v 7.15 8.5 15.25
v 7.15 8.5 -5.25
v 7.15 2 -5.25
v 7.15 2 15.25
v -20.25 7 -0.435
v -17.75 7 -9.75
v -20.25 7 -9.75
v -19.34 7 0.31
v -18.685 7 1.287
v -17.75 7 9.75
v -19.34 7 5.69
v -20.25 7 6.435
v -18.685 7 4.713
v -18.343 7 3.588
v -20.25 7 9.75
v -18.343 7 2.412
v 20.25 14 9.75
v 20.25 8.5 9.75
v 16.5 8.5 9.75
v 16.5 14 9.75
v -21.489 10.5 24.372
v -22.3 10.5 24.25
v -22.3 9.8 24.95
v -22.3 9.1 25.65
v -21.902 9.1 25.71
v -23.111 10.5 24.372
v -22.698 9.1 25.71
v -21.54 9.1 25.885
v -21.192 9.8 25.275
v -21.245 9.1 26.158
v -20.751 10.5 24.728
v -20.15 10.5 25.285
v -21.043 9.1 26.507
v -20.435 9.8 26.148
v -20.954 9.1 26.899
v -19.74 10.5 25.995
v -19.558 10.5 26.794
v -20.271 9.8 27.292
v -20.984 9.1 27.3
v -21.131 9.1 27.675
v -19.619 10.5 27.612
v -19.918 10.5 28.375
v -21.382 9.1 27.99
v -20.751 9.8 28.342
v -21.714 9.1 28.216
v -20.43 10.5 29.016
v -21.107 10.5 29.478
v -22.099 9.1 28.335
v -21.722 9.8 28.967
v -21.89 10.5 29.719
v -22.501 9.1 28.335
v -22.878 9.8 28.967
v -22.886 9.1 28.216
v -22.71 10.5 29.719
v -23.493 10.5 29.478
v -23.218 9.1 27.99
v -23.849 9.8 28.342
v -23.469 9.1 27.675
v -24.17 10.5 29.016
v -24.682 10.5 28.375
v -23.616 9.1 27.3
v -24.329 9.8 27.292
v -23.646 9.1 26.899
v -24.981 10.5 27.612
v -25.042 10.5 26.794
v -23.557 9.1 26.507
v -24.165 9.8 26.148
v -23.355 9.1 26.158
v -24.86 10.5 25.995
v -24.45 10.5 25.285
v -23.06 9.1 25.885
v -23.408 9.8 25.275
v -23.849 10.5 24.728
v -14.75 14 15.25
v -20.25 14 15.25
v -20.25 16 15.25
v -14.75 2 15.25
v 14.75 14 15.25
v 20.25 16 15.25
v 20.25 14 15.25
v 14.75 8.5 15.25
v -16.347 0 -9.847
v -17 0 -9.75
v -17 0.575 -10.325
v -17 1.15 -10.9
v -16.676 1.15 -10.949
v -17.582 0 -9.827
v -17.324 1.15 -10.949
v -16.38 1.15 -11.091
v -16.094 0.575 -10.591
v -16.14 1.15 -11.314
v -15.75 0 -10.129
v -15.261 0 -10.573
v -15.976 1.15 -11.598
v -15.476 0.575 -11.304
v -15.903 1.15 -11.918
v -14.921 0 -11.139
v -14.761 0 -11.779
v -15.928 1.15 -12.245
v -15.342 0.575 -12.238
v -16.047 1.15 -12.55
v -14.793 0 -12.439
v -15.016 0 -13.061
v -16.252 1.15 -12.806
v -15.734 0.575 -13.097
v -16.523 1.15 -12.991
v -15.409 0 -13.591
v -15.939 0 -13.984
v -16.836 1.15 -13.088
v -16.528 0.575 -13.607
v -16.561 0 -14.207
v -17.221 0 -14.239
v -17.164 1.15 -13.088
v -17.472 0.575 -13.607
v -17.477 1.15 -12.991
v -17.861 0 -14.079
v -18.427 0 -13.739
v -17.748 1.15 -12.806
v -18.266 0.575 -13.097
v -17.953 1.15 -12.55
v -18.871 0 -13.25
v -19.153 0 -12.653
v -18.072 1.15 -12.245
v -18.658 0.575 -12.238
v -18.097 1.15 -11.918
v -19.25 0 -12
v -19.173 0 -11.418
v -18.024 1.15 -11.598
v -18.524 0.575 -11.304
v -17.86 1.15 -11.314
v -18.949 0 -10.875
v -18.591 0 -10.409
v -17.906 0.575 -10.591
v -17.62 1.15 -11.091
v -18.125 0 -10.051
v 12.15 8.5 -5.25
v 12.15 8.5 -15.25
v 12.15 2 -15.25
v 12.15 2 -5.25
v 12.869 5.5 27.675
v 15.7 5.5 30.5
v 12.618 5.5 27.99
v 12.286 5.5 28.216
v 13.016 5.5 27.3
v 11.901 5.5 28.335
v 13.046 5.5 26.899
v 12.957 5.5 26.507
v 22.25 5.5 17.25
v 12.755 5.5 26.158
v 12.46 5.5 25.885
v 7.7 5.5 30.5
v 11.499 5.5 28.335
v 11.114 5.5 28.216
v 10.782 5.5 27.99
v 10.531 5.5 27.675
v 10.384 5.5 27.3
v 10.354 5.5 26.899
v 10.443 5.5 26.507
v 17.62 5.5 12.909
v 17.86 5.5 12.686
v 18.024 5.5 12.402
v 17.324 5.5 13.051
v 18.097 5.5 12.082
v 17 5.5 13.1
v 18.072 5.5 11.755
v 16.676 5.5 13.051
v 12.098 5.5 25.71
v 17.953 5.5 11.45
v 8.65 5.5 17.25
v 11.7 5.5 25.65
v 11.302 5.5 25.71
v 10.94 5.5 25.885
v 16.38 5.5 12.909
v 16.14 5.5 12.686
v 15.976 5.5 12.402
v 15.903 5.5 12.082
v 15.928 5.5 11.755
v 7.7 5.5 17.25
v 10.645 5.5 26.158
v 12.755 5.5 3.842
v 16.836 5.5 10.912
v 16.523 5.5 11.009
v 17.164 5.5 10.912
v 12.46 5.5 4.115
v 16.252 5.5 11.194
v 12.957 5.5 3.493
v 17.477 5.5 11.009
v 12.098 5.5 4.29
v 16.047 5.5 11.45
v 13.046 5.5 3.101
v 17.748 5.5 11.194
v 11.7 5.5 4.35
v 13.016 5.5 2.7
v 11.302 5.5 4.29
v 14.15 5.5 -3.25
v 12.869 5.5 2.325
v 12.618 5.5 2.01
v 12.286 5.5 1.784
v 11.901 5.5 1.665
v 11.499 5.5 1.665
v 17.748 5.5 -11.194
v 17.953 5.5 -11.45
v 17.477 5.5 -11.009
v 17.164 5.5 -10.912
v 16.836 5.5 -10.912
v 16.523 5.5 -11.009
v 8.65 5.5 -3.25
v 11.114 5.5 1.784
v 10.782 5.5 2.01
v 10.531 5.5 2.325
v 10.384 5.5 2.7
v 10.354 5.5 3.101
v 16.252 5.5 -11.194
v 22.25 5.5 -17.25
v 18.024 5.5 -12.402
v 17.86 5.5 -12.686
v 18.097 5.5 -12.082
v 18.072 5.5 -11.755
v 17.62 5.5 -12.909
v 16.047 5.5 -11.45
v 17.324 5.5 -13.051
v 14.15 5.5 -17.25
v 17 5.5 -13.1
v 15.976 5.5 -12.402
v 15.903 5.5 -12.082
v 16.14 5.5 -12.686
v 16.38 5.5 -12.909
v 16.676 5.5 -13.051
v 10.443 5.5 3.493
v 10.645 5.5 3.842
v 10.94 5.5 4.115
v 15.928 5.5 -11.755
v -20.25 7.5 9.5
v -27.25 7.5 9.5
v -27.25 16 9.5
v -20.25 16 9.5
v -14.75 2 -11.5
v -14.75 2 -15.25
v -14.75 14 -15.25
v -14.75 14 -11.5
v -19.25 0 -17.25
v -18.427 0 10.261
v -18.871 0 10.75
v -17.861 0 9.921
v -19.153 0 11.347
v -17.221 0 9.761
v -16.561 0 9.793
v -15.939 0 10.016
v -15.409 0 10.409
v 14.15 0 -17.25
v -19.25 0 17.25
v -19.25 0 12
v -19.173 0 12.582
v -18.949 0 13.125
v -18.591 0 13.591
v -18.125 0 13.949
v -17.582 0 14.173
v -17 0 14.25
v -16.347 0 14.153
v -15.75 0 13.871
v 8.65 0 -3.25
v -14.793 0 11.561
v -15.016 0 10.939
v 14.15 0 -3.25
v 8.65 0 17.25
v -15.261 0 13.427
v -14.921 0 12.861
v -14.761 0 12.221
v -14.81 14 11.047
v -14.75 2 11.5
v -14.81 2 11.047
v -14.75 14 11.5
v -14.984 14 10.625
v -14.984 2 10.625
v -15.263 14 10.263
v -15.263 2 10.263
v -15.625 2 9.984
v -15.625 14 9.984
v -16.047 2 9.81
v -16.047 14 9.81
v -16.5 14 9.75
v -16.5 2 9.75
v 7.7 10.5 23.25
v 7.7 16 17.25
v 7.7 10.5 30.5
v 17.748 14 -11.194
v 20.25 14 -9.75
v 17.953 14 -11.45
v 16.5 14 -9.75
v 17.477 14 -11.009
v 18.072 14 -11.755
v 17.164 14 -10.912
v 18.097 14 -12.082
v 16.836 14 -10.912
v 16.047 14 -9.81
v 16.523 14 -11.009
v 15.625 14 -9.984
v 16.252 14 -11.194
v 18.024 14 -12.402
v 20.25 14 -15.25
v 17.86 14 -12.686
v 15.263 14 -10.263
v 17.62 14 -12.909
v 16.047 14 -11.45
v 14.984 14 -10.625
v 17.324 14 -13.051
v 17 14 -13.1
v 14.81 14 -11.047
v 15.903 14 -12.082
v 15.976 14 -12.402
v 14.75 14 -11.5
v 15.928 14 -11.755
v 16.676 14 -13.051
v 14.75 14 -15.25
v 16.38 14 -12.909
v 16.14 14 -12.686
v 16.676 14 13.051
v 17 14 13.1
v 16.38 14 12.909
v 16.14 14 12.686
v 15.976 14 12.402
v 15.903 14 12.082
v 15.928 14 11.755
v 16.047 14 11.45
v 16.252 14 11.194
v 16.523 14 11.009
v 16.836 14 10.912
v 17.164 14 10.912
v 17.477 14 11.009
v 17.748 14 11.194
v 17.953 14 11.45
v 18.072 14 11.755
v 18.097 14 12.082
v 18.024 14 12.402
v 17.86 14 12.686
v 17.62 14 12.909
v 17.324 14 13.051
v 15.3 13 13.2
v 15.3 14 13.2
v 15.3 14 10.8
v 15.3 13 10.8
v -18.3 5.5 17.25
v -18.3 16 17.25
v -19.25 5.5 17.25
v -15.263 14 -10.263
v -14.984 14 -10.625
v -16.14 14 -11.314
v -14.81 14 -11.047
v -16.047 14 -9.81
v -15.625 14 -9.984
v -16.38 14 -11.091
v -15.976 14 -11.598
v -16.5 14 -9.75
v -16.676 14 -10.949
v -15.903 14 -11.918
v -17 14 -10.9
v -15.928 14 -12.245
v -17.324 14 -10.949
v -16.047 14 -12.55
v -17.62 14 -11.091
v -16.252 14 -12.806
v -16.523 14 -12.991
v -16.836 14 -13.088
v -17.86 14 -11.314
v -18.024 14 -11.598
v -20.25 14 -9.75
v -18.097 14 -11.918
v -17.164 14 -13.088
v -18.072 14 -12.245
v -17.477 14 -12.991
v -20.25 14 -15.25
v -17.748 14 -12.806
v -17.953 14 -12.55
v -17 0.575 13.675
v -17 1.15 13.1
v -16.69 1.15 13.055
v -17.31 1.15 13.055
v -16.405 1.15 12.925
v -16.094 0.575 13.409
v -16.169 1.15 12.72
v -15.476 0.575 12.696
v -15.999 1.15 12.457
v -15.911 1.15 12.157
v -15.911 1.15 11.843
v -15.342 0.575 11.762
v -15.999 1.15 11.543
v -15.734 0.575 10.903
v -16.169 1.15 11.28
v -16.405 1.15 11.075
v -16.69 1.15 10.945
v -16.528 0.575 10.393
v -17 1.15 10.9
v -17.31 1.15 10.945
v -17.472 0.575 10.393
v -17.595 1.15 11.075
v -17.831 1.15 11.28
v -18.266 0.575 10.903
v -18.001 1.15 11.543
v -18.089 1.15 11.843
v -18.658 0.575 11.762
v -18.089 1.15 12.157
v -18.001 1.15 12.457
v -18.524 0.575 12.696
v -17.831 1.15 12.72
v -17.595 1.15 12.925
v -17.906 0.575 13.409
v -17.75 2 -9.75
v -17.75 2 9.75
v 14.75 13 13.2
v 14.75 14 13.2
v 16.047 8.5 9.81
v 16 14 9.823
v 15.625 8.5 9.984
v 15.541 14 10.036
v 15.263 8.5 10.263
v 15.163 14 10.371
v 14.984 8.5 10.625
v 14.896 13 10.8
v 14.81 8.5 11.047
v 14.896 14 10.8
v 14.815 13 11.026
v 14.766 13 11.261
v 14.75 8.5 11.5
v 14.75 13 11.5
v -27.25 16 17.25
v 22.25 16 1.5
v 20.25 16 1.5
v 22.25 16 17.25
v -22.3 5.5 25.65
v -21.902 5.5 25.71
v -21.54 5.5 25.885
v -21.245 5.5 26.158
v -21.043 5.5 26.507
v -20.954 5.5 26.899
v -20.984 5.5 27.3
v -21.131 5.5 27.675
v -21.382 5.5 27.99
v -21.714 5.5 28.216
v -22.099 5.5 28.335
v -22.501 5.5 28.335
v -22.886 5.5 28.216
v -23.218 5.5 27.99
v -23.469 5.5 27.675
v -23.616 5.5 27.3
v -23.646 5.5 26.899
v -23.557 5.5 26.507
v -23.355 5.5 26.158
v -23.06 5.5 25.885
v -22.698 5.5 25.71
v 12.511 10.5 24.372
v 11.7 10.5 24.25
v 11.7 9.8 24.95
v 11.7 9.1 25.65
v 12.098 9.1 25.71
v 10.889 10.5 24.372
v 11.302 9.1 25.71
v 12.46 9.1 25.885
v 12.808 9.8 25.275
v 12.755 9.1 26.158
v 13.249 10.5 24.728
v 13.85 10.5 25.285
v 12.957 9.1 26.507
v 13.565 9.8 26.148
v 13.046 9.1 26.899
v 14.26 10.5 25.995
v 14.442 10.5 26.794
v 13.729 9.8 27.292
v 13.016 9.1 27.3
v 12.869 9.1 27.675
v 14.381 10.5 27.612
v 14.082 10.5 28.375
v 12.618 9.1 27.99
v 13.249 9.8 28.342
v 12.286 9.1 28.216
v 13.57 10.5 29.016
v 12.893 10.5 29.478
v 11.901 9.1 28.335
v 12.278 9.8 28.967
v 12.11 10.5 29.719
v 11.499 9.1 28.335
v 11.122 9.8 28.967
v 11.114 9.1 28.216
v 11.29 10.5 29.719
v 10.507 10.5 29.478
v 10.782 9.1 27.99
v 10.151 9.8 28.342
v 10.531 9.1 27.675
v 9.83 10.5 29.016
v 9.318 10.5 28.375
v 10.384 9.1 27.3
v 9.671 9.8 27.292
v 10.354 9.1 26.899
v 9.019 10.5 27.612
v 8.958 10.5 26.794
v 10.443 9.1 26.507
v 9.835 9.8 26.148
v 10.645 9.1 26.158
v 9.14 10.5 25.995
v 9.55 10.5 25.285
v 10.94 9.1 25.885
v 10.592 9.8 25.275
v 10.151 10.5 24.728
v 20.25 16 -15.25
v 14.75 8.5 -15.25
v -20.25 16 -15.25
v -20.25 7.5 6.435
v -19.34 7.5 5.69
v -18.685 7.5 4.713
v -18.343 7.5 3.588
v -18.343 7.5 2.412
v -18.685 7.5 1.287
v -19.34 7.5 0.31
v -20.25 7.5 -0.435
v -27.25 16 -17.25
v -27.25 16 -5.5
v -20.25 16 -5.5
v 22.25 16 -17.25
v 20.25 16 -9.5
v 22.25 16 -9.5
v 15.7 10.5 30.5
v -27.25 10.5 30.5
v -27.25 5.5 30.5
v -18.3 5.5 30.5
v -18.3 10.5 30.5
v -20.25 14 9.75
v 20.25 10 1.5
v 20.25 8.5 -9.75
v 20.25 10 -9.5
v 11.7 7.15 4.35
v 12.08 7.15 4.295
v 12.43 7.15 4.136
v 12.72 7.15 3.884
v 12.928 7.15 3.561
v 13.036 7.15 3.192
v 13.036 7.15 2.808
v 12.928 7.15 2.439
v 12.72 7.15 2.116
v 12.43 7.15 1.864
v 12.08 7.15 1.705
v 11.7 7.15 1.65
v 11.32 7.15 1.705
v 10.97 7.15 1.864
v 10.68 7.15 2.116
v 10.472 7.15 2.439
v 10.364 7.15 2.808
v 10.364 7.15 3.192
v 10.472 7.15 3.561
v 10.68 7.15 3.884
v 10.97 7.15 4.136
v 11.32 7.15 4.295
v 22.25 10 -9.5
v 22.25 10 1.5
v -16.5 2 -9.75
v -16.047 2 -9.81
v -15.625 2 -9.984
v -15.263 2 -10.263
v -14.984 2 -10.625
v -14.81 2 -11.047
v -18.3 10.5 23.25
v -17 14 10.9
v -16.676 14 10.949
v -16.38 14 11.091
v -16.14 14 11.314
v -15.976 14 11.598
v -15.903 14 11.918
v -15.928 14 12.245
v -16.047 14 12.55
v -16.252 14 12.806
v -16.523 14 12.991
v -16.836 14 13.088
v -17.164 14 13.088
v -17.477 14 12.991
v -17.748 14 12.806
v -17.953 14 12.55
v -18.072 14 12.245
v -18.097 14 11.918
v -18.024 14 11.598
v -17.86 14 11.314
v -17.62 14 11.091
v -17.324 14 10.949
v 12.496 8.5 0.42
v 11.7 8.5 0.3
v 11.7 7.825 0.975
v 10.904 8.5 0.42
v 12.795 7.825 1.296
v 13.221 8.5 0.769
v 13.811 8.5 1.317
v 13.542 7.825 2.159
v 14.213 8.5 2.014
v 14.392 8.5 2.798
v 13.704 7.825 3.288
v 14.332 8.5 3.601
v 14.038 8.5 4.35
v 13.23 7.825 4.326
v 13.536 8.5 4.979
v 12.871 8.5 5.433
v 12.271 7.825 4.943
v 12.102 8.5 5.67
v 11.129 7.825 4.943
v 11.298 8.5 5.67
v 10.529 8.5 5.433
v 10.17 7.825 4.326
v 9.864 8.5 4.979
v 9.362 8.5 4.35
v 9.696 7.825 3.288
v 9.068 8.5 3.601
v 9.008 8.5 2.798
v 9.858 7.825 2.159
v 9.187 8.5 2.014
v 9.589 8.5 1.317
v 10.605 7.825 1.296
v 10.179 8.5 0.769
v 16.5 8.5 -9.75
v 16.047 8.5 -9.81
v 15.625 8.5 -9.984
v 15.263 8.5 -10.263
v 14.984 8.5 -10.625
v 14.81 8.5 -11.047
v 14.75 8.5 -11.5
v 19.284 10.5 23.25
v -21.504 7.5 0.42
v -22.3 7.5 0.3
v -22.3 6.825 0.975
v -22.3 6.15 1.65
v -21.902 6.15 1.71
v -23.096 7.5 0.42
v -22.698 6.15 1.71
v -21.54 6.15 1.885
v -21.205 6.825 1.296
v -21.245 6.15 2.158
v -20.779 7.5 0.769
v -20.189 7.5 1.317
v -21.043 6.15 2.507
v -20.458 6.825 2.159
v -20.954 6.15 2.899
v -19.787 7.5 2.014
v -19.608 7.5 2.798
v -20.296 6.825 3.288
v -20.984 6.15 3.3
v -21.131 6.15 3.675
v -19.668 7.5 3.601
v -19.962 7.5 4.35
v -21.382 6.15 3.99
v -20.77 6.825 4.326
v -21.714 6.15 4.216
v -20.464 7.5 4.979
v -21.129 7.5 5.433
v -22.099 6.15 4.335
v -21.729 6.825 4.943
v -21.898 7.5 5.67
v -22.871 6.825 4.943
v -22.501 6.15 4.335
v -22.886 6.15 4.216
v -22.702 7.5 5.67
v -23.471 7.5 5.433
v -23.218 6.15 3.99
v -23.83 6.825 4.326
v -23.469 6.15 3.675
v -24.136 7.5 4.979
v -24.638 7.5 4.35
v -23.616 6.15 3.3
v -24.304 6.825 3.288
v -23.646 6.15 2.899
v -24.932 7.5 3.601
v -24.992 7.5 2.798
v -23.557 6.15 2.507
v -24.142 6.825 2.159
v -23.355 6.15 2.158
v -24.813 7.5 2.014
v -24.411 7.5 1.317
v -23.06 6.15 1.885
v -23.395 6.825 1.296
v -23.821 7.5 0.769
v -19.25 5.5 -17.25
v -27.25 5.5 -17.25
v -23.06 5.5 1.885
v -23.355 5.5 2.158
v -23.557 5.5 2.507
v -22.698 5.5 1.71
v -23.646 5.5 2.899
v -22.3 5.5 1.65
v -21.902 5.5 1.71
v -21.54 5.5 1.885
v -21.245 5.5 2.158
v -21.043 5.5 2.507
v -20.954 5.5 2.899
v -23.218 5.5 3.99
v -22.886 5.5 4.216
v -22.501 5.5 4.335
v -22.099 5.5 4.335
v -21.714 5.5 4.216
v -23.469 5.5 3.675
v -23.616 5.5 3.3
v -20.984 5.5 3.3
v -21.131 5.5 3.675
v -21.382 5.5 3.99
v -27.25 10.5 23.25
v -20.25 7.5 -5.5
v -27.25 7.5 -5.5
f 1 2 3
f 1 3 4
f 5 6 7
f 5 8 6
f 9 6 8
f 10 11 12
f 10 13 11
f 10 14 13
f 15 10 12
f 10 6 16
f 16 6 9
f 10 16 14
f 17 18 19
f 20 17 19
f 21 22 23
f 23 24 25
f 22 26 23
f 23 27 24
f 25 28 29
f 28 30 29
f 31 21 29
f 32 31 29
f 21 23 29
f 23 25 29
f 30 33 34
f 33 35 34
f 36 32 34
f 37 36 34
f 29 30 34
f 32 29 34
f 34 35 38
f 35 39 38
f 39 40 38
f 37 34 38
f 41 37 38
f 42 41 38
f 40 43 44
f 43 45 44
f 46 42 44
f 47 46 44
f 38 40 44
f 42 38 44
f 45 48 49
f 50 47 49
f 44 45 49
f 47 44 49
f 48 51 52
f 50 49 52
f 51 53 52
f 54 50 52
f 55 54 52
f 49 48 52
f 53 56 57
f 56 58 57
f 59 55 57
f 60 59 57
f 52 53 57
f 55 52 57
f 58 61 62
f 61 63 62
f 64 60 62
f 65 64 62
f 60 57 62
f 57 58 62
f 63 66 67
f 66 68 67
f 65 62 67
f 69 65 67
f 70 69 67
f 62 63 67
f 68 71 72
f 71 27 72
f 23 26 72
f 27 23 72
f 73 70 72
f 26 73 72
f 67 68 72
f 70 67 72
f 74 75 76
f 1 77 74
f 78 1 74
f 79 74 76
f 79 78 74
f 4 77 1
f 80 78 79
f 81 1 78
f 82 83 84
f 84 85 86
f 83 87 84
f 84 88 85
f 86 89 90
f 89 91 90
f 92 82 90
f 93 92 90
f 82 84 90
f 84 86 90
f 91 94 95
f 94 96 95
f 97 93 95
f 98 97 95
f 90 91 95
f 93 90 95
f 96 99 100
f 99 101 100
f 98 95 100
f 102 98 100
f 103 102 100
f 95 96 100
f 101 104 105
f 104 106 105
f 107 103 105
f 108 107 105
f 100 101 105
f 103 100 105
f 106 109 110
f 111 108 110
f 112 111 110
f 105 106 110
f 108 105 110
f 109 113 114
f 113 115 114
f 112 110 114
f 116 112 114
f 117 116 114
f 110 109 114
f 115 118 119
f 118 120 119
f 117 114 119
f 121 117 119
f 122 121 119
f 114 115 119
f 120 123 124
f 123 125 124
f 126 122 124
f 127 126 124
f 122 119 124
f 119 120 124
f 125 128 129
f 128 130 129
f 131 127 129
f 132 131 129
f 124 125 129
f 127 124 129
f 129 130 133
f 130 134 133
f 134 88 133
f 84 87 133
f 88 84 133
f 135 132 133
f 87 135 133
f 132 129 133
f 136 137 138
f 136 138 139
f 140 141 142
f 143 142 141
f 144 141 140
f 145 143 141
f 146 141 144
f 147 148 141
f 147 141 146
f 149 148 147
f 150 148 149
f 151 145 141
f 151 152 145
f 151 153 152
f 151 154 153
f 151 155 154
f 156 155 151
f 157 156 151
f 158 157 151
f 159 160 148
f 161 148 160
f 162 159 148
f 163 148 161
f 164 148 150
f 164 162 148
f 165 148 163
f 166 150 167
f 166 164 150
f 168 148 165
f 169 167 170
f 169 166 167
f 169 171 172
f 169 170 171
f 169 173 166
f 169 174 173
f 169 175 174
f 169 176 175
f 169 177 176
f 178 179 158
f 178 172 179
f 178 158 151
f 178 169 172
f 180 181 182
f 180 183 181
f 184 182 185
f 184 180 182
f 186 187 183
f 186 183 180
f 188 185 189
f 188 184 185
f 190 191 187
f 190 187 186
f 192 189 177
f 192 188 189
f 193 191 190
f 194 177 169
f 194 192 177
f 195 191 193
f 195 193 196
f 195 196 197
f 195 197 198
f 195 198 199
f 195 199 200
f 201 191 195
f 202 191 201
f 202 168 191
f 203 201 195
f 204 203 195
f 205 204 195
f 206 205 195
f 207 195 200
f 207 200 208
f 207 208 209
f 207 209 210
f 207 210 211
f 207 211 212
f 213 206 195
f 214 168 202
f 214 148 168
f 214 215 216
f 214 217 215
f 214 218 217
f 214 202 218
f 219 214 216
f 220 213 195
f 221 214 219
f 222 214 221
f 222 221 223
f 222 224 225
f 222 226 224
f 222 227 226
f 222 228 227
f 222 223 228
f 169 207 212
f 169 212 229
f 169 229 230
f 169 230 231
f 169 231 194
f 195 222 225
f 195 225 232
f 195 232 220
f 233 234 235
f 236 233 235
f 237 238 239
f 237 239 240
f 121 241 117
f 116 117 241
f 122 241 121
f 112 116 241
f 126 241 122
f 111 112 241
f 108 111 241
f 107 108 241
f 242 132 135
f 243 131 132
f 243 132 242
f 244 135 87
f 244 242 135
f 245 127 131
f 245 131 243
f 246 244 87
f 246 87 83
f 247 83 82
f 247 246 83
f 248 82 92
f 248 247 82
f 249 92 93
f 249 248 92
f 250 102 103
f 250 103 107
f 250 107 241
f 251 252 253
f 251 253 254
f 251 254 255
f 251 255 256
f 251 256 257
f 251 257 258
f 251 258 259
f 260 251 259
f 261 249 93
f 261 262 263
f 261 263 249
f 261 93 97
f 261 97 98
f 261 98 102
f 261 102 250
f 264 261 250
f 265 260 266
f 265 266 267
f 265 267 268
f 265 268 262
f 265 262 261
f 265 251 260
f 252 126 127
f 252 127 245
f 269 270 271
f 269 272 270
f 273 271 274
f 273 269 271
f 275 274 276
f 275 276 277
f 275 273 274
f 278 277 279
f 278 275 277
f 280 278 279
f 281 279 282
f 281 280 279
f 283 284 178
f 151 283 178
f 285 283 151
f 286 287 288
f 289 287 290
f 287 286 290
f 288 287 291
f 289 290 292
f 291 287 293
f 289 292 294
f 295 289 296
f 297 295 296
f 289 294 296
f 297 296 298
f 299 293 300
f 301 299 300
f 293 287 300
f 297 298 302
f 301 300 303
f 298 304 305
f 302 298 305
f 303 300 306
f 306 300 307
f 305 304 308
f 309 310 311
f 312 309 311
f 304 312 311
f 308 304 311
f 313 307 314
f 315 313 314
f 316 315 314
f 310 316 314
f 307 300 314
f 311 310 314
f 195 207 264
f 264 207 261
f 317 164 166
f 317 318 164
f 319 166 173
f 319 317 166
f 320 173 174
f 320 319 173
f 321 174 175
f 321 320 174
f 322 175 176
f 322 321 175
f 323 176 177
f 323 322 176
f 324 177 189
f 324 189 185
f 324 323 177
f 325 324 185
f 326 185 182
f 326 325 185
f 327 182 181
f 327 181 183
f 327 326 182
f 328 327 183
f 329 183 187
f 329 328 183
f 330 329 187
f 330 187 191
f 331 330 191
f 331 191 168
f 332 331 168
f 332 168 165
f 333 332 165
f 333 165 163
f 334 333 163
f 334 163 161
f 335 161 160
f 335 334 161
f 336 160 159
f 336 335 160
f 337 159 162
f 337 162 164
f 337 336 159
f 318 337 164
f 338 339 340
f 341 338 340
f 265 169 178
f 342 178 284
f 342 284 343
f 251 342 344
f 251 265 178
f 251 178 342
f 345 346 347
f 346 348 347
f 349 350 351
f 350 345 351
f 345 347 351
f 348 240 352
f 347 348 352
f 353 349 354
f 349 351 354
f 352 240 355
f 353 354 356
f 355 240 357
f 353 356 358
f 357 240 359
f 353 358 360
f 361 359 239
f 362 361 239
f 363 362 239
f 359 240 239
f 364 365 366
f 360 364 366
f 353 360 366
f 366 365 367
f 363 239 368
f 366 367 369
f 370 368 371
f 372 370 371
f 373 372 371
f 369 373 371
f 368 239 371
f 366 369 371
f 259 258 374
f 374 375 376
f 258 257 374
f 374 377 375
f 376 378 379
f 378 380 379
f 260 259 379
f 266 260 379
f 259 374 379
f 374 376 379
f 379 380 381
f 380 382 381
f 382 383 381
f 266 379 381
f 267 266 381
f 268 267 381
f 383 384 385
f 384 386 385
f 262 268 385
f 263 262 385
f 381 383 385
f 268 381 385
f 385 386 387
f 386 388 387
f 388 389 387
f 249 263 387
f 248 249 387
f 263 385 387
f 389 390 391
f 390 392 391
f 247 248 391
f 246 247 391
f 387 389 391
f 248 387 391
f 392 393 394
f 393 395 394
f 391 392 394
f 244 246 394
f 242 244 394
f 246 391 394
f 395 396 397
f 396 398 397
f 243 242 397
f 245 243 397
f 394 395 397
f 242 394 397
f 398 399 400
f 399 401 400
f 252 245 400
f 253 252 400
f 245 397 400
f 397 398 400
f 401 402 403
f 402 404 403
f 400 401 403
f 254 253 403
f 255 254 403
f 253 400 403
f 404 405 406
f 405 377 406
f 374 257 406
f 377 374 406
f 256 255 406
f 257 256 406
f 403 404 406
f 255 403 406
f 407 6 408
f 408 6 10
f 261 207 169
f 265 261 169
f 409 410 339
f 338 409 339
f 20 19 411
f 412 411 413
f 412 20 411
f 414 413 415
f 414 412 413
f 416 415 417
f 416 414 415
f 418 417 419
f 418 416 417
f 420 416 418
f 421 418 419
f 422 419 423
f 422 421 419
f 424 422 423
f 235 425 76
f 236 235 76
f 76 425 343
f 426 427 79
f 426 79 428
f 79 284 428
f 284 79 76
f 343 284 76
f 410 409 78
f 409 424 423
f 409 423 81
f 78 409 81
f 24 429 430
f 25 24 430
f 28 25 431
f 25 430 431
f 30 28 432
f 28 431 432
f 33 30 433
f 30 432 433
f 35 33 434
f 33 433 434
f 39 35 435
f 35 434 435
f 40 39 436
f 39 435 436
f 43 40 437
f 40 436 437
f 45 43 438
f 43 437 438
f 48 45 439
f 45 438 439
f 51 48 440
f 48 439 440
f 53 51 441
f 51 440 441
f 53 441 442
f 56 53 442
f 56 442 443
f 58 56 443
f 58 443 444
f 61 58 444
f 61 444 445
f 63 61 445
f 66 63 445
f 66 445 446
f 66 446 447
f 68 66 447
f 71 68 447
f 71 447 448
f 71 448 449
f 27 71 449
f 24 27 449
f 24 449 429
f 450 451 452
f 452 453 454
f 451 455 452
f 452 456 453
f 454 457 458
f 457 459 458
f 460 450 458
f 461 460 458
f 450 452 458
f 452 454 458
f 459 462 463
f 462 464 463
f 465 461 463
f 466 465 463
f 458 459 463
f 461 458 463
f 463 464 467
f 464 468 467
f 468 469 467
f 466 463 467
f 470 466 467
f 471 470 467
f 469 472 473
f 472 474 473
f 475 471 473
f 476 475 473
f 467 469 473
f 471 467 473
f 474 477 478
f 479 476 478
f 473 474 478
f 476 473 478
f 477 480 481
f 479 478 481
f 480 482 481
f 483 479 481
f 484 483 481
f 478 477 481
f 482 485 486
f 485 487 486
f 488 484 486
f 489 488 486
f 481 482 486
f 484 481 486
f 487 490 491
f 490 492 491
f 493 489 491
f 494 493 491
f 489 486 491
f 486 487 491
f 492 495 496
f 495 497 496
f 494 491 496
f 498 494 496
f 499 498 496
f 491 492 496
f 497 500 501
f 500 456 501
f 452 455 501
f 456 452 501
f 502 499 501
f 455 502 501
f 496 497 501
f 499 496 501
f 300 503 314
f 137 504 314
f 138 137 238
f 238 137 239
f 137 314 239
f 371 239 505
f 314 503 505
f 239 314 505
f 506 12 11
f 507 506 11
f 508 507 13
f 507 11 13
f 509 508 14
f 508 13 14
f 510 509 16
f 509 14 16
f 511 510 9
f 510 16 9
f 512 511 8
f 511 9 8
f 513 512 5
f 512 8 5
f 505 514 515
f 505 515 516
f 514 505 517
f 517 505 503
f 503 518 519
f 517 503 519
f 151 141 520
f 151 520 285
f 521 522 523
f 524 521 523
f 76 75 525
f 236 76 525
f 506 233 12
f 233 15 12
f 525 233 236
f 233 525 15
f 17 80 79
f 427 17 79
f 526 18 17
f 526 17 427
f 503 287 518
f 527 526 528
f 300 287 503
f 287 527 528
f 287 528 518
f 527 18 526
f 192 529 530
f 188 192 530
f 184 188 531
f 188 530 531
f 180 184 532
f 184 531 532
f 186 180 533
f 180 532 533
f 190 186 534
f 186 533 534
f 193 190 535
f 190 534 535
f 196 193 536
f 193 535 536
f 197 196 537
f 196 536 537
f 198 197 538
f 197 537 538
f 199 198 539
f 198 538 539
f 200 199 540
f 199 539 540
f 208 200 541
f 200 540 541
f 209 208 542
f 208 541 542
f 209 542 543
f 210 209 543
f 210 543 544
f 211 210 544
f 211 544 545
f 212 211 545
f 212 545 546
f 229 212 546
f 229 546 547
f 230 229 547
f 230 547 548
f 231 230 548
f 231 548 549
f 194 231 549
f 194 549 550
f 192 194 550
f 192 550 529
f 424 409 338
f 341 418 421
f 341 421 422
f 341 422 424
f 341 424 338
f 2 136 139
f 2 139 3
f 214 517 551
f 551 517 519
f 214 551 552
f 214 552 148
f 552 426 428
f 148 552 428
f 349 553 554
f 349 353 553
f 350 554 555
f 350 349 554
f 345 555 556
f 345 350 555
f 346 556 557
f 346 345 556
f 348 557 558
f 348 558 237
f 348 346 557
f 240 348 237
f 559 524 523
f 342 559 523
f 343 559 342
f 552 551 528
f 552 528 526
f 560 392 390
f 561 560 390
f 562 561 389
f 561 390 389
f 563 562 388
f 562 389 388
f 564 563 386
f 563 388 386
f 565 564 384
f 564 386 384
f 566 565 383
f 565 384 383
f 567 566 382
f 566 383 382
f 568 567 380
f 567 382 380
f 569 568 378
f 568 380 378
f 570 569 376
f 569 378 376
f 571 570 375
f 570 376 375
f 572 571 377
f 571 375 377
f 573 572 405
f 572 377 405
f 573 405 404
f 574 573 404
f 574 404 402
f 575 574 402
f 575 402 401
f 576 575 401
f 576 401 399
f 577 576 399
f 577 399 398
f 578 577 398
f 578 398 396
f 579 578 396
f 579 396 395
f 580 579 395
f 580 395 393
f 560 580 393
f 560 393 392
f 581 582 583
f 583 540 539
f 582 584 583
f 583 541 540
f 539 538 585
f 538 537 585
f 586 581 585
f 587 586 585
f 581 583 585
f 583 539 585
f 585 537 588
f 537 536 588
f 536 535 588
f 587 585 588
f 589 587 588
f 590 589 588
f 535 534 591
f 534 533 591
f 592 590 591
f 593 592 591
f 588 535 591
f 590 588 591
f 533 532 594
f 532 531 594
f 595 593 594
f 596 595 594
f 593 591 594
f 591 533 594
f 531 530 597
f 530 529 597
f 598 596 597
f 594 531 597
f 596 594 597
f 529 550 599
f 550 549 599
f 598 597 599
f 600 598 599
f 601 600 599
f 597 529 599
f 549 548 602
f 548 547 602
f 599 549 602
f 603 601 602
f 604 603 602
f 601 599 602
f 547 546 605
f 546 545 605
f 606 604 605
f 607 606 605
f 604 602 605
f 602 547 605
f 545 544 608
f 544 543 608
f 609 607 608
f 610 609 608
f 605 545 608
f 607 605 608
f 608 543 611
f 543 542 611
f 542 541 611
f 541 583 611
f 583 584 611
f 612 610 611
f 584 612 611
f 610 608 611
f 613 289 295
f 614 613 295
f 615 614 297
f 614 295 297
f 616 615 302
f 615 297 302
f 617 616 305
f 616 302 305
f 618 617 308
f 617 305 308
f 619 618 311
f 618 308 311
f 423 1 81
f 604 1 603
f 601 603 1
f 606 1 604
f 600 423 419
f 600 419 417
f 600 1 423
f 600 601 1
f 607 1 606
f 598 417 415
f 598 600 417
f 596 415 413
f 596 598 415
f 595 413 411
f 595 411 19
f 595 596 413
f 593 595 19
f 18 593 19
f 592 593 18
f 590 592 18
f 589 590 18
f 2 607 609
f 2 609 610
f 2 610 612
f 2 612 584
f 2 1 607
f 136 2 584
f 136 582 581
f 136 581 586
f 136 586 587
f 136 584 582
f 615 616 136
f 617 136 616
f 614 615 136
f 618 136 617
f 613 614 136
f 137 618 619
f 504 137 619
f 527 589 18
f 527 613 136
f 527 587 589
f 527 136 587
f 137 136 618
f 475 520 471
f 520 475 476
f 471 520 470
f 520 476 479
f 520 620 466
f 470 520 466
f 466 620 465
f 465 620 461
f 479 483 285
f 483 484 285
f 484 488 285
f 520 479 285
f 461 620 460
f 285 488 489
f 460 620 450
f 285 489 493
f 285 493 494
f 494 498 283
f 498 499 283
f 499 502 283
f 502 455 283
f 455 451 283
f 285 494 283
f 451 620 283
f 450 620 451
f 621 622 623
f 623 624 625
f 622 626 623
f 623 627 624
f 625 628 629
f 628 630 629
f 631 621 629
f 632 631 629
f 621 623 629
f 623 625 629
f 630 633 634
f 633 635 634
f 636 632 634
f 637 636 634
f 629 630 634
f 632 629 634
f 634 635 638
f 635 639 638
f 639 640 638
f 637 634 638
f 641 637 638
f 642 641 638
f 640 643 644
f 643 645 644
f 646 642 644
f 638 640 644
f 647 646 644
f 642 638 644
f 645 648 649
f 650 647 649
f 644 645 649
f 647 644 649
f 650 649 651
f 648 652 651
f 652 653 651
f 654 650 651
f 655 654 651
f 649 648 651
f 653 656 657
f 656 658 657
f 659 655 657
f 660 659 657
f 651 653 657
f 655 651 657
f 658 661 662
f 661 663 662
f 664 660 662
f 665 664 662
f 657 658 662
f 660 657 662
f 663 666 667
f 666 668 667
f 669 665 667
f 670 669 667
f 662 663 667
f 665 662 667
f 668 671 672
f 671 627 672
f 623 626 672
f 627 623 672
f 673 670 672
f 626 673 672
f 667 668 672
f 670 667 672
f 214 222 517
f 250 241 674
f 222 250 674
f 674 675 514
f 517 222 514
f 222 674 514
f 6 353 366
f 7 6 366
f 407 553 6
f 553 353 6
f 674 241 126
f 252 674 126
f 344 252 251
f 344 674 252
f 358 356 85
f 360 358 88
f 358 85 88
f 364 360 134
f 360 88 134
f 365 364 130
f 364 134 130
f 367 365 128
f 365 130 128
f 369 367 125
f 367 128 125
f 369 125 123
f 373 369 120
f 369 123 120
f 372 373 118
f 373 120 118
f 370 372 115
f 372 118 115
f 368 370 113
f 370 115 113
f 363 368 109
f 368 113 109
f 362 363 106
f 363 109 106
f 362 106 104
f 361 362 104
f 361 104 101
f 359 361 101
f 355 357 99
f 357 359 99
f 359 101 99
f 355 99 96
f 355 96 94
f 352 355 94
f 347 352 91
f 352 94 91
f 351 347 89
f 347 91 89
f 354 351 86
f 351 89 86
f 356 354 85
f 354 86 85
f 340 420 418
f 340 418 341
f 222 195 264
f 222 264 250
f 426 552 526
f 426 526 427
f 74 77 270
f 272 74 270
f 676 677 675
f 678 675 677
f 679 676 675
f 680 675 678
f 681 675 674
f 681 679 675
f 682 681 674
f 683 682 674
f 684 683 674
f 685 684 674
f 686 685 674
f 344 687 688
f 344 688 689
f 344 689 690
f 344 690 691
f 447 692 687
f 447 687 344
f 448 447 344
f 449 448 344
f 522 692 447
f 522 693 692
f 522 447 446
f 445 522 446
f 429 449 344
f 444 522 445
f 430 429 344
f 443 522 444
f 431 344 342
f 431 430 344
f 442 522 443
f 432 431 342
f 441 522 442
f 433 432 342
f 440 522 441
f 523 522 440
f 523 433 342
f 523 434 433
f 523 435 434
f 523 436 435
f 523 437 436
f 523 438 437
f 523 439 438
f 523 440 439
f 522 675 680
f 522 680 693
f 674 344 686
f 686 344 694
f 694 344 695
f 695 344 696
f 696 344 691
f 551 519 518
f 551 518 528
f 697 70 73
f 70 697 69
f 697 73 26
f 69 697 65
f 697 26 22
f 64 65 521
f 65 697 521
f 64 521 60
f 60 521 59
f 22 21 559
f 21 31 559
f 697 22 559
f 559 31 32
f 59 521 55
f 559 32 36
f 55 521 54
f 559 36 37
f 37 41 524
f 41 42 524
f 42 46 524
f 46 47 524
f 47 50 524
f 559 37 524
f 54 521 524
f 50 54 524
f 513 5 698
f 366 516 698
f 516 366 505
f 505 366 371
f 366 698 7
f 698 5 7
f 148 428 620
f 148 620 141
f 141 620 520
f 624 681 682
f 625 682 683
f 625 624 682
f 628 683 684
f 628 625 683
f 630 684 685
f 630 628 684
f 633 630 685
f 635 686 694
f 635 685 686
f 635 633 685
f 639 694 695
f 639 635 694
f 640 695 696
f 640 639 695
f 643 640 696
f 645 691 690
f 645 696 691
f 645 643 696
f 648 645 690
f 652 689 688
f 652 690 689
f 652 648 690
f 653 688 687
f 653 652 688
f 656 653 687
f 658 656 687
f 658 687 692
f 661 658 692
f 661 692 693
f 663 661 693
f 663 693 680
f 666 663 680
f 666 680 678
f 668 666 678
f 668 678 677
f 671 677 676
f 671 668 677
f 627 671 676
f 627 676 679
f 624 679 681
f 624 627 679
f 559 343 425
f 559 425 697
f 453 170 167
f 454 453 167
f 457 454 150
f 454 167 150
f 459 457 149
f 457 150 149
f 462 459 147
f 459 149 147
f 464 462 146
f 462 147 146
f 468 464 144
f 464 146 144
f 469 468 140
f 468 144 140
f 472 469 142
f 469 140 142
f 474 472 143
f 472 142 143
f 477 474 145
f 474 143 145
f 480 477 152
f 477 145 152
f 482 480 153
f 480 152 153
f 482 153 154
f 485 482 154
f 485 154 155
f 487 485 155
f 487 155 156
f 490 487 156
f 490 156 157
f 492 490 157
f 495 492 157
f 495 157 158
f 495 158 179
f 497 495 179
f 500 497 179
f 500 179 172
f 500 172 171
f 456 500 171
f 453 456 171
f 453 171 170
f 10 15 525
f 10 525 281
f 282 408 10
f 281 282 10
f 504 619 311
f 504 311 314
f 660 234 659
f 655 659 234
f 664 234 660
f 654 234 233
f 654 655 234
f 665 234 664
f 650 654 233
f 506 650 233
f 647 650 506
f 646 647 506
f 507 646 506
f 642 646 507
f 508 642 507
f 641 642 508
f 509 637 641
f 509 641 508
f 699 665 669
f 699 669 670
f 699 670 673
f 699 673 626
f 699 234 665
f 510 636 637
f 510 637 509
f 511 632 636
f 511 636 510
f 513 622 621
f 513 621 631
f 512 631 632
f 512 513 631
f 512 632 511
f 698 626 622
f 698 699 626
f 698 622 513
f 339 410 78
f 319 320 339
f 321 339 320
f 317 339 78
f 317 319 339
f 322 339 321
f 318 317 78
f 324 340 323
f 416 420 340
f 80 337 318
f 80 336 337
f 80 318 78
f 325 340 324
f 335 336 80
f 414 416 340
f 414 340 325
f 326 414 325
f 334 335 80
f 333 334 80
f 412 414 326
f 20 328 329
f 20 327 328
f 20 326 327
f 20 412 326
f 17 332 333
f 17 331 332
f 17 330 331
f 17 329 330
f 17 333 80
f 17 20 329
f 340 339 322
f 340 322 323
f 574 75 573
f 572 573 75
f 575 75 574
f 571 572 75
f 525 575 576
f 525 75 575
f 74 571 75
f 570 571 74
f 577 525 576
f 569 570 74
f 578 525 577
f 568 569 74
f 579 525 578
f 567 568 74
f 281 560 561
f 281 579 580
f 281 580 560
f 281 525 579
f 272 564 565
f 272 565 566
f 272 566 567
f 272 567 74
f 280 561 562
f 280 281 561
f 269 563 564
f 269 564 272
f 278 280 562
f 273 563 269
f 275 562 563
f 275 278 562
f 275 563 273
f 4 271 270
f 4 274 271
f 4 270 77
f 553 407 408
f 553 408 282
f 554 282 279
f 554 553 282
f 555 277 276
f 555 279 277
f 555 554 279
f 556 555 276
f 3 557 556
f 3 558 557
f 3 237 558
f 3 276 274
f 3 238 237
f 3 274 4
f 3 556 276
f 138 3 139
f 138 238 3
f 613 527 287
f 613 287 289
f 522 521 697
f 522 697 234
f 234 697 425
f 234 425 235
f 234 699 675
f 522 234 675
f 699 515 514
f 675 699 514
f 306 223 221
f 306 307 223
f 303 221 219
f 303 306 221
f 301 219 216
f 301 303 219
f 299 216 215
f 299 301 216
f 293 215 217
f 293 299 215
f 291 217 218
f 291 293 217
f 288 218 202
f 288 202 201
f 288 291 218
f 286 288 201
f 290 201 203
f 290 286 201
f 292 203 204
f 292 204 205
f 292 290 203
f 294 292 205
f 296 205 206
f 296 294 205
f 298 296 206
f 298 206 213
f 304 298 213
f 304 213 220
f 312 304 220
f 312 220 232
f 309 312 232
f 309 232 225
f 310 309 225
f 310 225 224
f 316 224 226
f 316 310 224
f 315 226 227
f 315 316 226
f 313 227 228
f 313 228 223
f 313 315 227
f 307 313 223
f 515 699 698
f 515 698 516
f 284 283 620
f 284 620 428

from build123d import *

# Parameters (mm, degrees)
SKETCH_1_W                          = 44.5
SKETCH_1_H                          = 34.5
EXTRUDE_1_DEPTH                     = 16
SHELL_1_T                           = -2
SKETCH_2_W                          = 5.5000000000000036
SKETCH_2_H                          = 5.499999999999993
EXTRUDE_2_DEPTH                     = 12
SKETCH_3_R                          = 1.0999999999999992
CUT_EXTRUDE_1_DEPTH                 = 32.44240766862487
FILLET_1_R                          = 1.75
SKETCH_7_W                          = 15.099999999999996
SKETCH_7_H                          = 34.5
CUT_EXTRUDE_4_DEPTH                 = 7
SKETCH_8_W                          = 15.099999999999996
SKETCH_8_H                          = 34.5
SKETCH_8_R                          = 1.0999999999999992
EXTRUDE_3_DEPTH                     = 1.5
EXTRUDE_4_DEPTH                     = 1.5
CUT_EXTRUDE_6_DEPTH                 = 5
SKETCH_13_W                         = 34.5
SKETCH_13_H                         = 5.5
EXTRUDE_7_DEPTH                     = 1.5
SKETCH_14_R                         = 1.0999999999999992
SKETCH_14_R_2                       = 1.0999999999999954
CUT_EXTRUDE_7_DEPTH                 = 33.382479830920914
EXTRUDE_8_DEPTH                     = 10.5
SKETCH_18_W                         = 8.950000000000003
SKETCH_18_H                         = 13.250000000000004
SKETCH_18_R                         = 1.3500000000000054
SKETCH_18_R_2                       = 1.3500000000000005
EXTRUDE_9_DEPTH                     = 5
CUT_EXTRUDE_8_DEPTH                 = 43.22632472759144
CUT_EXTRUDE_8_DEPTH_BACK            = 43.22632472759144
SKETCH_18_3_R                       = 1.3500000000000059
SKETCH_18_3_R_2                     = 1.3500000000000005
HOLE_WIZARD_M2_5_1_D                = 2.7
HOLE_WIZARD_M2_5_1_DEPTH            = 24.83
HOLE_WIZARD_M2_5_1_CSINK_D          = 5.5
HOLE_WIZARD_M2_5_1_CSINK_ANGLE      = 90
HOLE_WIZARD_M2_5_1_TIP              = 0.8111618356872065
EXTRUDE_10_DEPTH                    = 8.95
SKETCH_22_W                         = 2
SKETCH_22_H                         = 2.399999999999997
CUT_EXTRUDE_9_DEPTH                 = 1
HOLE_WIZARD_1_D                     = 2.2
HOLE_WIZARD_1_CSINK_D               = 4.5
HOLE_WIZARD_1_CSINK_ANGLE           = 90
CUT_EXTRUDE_10_DEPTH                = 42.878544626097025
EXTRUDE_11_DEPTH                    = 2
EXTRUDE_START                       = -2
EXTRUDE_12_DEPTH                    = 2
EXTRUDE_13_DEPTH                    = 2
EXTRUDE_14_DEPTH                    = 2
SKETCH_31_W                         = 15
SKETCH_31_H                         = 8.5
CUT_EXTRUDE_11_DEPTH                = 10
EXTRUDE_START_2                     = 1.5
SKETCH_32_R                         = 1.3500000000000005
EXTRUDE_15_DEPTH                    = 1.5
EXTRUDE_START_3                     = -0.5
SKETCH_34_R                         = 3.999999999999999
SKETCH_34_R_2                       = 1.3500000000000059
EXTRUDE_18_DEPTH                    = 0.5
HOLE_WIZARD_2_D                     = 2.7
HOLE_WIZARD_2_CSINK_D               = 5.4
HOLE_WIZARD_2_CSINK_ANGLE           = 90
HOLE_WIZARD_2_ON_FACE_2_D           = 2.7
HOLE_WIZARD_2_ON_FACE_2_CSINK_D     = 5.4
HOLE_WIZARD_2_ON_FACE_2_CSINK_ANGLE = 90
EXTRUDE_19_DEPTH                    = 5
EXTRUDE_20_DEPTH                    = 17.499999999999996
CUT_EXTRUDE_12_DEPTH                = 17.499999999999996


with BuildPart() as part:
    # 草图1 → 凸台-拉伸1 (new body)
    with BuildSketch(Plane(origin=(0, 0, 0), x_dir=(1, 0, 0), z_dir=(0, 1, 0))):
        Rectangle(SKETCH_1_W, SKETCH_1_H)
    extrude(amount=EXTRUDE_1_DEPTH)

    # 抽壳1
    shell_1_openings = [part.faces().sort_by_distance(p)[0] for p in [
        (0, 16, 0),
    ]]
    offset(amount=SHELL_1_T, openings=shell_1_openings, kind=Kind.INTERSECTION)

    # 草图2 → 凸台-拉伸2 (add)
    with BuildSketch(Plane(origin=(0, 2, 0), x_dir=(1, 0, 0), z_dir=(0, 1, 0))):
        Polygon((20.249999999999996, -15.250000000000002), (20.25, -9.75), (14.749999999999993, -9.749999999999996), (14.749999999999995, -15.250000000000005), align=None)
        Polygon((-20.249999999999996, 15.250000000000002), (-14.749999999999995, 15.250000000000002), (-14.749999999999995, 9.750000000000002), (-20.249999999999993, 9.750000000000002), align=None)
        with Locations((-17.499999999999993, -12.500000000000005)):
            Rectangle(SKETCH_2_W, SKETCH_2_H)
        Polygon((20.249999999999996, 9.75), (14.749999999999991, 9.749999999999996), (14.749999999999991, 15.250000000000005), (20.249999999999996, 15.250000000000002), align=None)
    extrude(amount=EXTRUDE_2_DEPTH)

    # 草图3 → 切除-拉伸1 (cut, through all)
    with BuildSketch(Plane(origin=(0, 14, 0), x_dir=(1, 0, 0), z_dir=(0, 1, 0))):
        with Locations(Location((-17, 12, 0), (0, 0, 270))):
            Circle(SKETCH_3_R)
        with Locations(Location((17, 12, 0), (0, 0, 90))):
            Circle(SKETCH_3_R)
        with Locations(Location((17, -12, 0), (0, 0, 270))):
            Circle(SKETCH_3_R)
        with Locations(Location((-17, -12, 0), (0, 0, 90))):
            Circle(SKETCH_3_R)
    extrude(amount=-CUT_EXTRUDE_1_DEPTH, mode=Mode.SUBTRACT)

    # 圆角1
    fillet_1_edges = [part.edges().sort_by_distance(p)[0] for p in [
        (-14.749999999999995, 8, -9.750000000000002),
        (-14.749999999999993, 8, 9.750000000000009),
        (14.749999999999993, 8, 9.749999999999996),
        (14.749999999999991, 8, -9.749999999999996),
    ]]
    fillet(fillet_1_edges, radius=FILLET_1_R)

    # 草图7 → 切除-拉伸4 (cut)
    with BuildSketch(Plane.XZ):
        with Locations((14.700000000000003, 0)):
            Rectangle(SKETCH_7_W, SKETCH_7_H)
        Polygon((-22.25, 17.25), (-17.75, 17.25), (-17.74999999999999, -17.25), (-22.25, -17.25), align=None)
    extrude(amount=-CUT_EXTRUDE_4_DEPTH, mode=Mode.SUBTRACT)

    # 草图8 → 凸台-拉伸3 (add)
    # profile 1 of 2: a face of its own
    with BuildSketch(Plane.XZ.offset(-7)):
        with Locations((14.700000000000003, 0)):
            Rectangle(SKETCH_8_W, SKETCH_8_H)
        with Locations(Location((17, 12, 0), (0, 0, 90))):
            Circle(SKETCH_8_R, mode=Mode.SUBTRACT)
        with Locations(Location((17, -12, 0), (0, 0, 270))):
            Circle(SKETCH_8_R, mode=Mode.SUBTRACT)
    # profile 2 of 2: a face of its own
    with BuildSketch(Plane.XZ.offset(-7)):
        Polygon((-22.25, 17.25), (-17.749999999999993, 17.25), (-17.74999999999999, -17.25), (-22.25, -17.25), align=None)
    extrude(amount=EXTRUDE_3_DEPTH)

    # 草图9 → 凸台-拉伸4 (add)
    with BuildSketch(Plane(origin=(7.150000000000004, 0, 0), x_dir=(0, 0, -1), z_dir=(1, 0, 0))):
        Polygon((17.25, 0), (-17.25, -4.16e-15), (-17.25, 5.5), (17.25, 5.5000000000000036), align=None)
    extrude(amount=EXTRUDE_4_DEPTH)

    # 草图12 → 切除-拉伸6 (cut)
    with BuildSketch(Plane(origin=(22.25, 0, 0), x_dir=(0, 0, -1), z_dir=(1, 0, 0))):
        Polygon((9.500000000000002, 10.000000000000002), (-1.4999999999999996, 10), (-1.4999999999999996, 16), (9.5, 16), align=None)
    extrude(amount=-CUT_EXTRUDE_6_DEPTH, mode=Mode.SUBTRACT)

    # 草图13 → 凸台-拉伸7 (add)
    with BuildSketch(Plane.ZY.offset(17.749999999999996)):
        with Locations((7.11e-15, 2.75)):
            Rectangle(SKETCH_13_W, SKETCH_13_H)
    extrude(amount=EXTRUDE_7_DEPTH)

    # 草图14 → 切除-拉伸7 (cut, through all)
    with BuildSketch(Plane.XZ):
        with Locations(Location((-17, 12, 0), (0, 0, 270))):
            Circle(SKETCH_14_R)
        with Locations(Location((-17, -12, 0), (0, 0, 90))):
            Circle(SKETCH_14_R_2)
    extrude(amount=-CUT_EXTRUDE_7_DEPTH, mode=Mode.SUBTRACT)

    # 草图16 → 凸台-拉伸8 (add)
    with BuildSketch(Plane.XZ.offset(-5.5)):
        Polygon((-22.25, 17.25), (-27.25, 17.25), (-27.249999999999996, -17.25), (-22.25, -17.25), align=None)
    extrude(amount=-EXTRUDE_8_DEPTH)

    # 草图18 → 凸台-拉伸9 (add)
    # profile 1 of 2: a face of its own
    with BuildSketch(Plane.XZ.offset(-5.5)):
        with Locations((-22.775000000000002, 23.875)):
            Rectangle(SKETCH_18_W, SKETCH_18_H)
        with Locations(Location((-22.299999999999994, 27, 0), (0, 0, 270))):
            Circle(SKETCH_18_R, mode=Mode.SUBTRACT)
    # profile 2 of 2: a face of its own
    with BuildSketch(Plane.XZ.offset(-5.5)):
        Polygon((7.700000000000007, 17.25), (15.7, 17.25), (15.7, 30.500000000000004), (7.7000000000000055, 30.500000000000004), align=None)
        with Locations(Location((11.700000000000003, 27, 0), (0, 0, 270))):
            Circle(SKETCH_18_R_2, mode=Mode.SUBTRACT)
    extrude(amount=-EXTRUDE_9_DEPTH)

    # 草图18<3> → 切除-拉伸8 (cut, two sides: drawn at the far end of the back side and taken through both)
    with BuildSketch(Plane.XZ.offset(-5.5).offset(-CUT_EXTRUDE_8_DEPTH_BACK)):
        with Locations(Location((-22.299999999999997, 3, 0), (0, 0, 270))):
            Circle(SKETCH_18_3_R)
        with Locations(Location((11.700000000000006, 3, 0), (0, 0, 90))):
            Circle(SKETCH_18_3_R_2)
    extrude(amount=CUT_EXTRUDE_8_DEPTH + CUT_EXTRUDE_8_DEPTH_BACK, mode=Mode.SUBTRACT)

    # M2.5 锥坑高头螺钉的锥形沉头孔1
    with Locations(Plane(origin=(-22.3, 10.5, 27), x_dir=(0, 0, 1), z_dir=(0, 1, 0))):
        with Locations((0, 0), (0, 34)):
            CounterSinkHole(HOLE_WIZARD_M2_5_1_D / 2, HOLE_WIZARD_M2_5_1_CSINK_D / 2, depth=HOLE_WIZARD_M2_5_1_DEPTH, counter_sink_angle=HOLE_WIZARD_M2_5_1_CSINK_ANGLE)
            with Locations((0, 0, -(HOLE_WIZARD_M2_5_1_DEPTH + HOLE_WIZARD_M2_5_1_TIP / 2))):  # 118° drill point
                Cone(0, HOLE_WIZARD_M2_5_1_D / 2, HOLE_WIZARD_M2_5_1_TIP, mode=Mode.SUBTRACT)

    # 草图20 → 凸台-拉伸10 (add)
    with BuildSketch(Plane(origin=(-18.3, 0, 0), x_dir=(0, 0, -1), z_dir=(1, 0, 0))):
        Polygon((-23.25, 10.499999999999998), (-17.25, 10.499999999999998), (-17.25, 16), align=None)
    extrude(amount=-EXTRUDE_10_DEPTH)

    # 草图22 → 切除-拉伸9 (cut)
    with BuildSketch(Plane(origin=(0, 14, 0), x_dir=(1, 0, 0), z_dir=(0, 1, 0))):
        with Locations((14.3, -12)):
            Rectangle(SKETCH_22_W, SKETCH_22_H)
    extrude(amount=-CUT_EXTRUDE_9_DEPTH, mode=Mode.SUBTRACT)

    # 打孔尺寸(%根据十字)槽沉头木螺钉的类型1 (through all)
    with Locations(Plane(origin=(-17, 0, 12), x_dir=(0, 0, -1), z_dir=(0, -1, 0))):
        with Locations((0, 0), (24, 0)):
            CounterSinkHole(HOLE_WIZARD_1_D / 2, HOLE_WIZARD_1_CSINK_D / 2, counter_sink_angle=HOLE_WIZARD_1_CSINK_ANGLE)

    # 草图25 → 切除-拉伸10 (cut, through all)
    with BuildSketch(Plane(origin=(0, 7, 0), x_dir=(1, 0, 0), z_dir=(0, 1, 0))):
        Polygon((7.150000000000004, 3.2500000000000027), (12.150000000000006, 3.2500000000000044), (12.150000000000006, 15.250000000000005), (7.150000000000005, 15.250000000000007), align=None)
    extrude(amount=-CUT_EXTRUDE_10_DEPTH, mode=Mode.SUBTRACT)

    # 草图26 → 凸台-拉伸11 (add)
    with BuildSketch(Plane(origin=(-1.13e-15, 0, -3.2500000000000004), x_dir=(-1, 0, 3.5e-16), z_dir=(-3.5e-16, 0, -1))):
        Polygon((-7.150000000000005, 7), (-12.150000000000007, 7), (-12.150000000000004, 0), (-7.150000000000005, -4.34e-15), align=None)
    extrude(amount=EXTRUDE_11_DEPTH)

    # 草图27 → 凸台-拉伸12 (add)
    with BuildSketch(Plane(origin=(0, 0, -17.25), x_dir=(-1, 0, 0), z_dir=(0, 0, -1)).offset(EXTRUDE_START)):
        Polygon((-12.150000000000002, 0), (-8.650000000000004, 0), (-8.650000000000004, 5.5), (-12.150000000000006, 5.5), align=None)
    extrude(amount=EXTRUDE_12_DEPTH)

    # 草图28 → 凸台-拉伸13 (add)
    with BuildSketch(Plane(origin=(12.150000000000004, -6.02e-15, -4.22e-15), x_dir=(-3.5e-16, 0, -1), z_dir=(1, -5e-16, -3.5e-16))):
        Polygon((17.249999999999996, 6.02e-15), (17.249999999999993, 5.500000000000011), (3.2500000000000004, 5.500000000000005), (3.2500000000000004, 6.02e-15), align=None)
    extrude(amount=EXTRUDE_13_DEPTH)

    # 草图29 → 凸台-拉伸14 (add)
    with BuildSketch(Plane.XZ):
        Polygon((12.150000000000002, -5.250000000000004), (7.150000000000003, -5.250000000000003), (7.150000000000005, -15.250000000000007), (12.149999999999999, -15.250000000000002), align=None)
    extrude(amount=-EXTRUDE_14_DEPTH)

    # 草图31 → 切除-拉伸11 (cut)
    with BuildSketch(Plane.ZY.offset(27.249999999999996)):
        with Locations((2.0000000000000053, 11.75)):
            Rectangle(SKETCH_31_W, SKETCH_31_H)
    extrude(amount=-CUT_EXTRUDE_11_DEPTH, mode=Mode.SUBTRACT)

    # 草图32 → 凸台-拉伸15 (add)
    with BuildSketch(Plane(origin=(0, 7, 0), x_dir=(1, 0, 0), z_dir=(0, 1, 0)).offset(EXTRUDE_START_2)):
        with BuildLine():
            Line((12.150000000000006, 15.250000000000005), (12.150000000000006, 5.250000000000004))
            Line((12.150000000000006, 5.250000000000004), (7.150000000000003, 5.250000000000003))
            Line((7.150000000000003, 5.250000000000003), (7.150000000000004, -15.25))
            Line((7.150000000000004, -15.25), (14.749999999999995, -15.250000000000005))
            Line((14.749999999999995, -15.250000000000005), (14.749999999999993, -11.499999999999998))
            ThreePointArc((14.749999999999993, -11.499999999999998), (15.262563132923535, -10.26256313292354), (16.499999999999993, -9.749999999999998))
            Line((16.499999999999993, -9.749999999999998), (20.25, -9.75))
            Line((20.25, -9.75), (20.249999999999996, 9.750000000000002))
            Line((20.249999999999996, 9.750000000000002), (16.49999999999999, 9.749999999999998))
            ThreePointArc((16.49999999999999, 9.749999999999998), (15.262563132923532, 10.262563132923542), (14.749999999999991, 11.5))
            Line((14.749999999999991, 11.5), (14.749999999999991, 15.250000000000005))
            Line((14.749999999999991, 15.250000000000005), (12.150000000000006, 15.250000000000005))
        make_face()
        with Locations(Location((11.700000000000006, -3, 0), (0, 0, 270))):
            Circle(SKETCH_32_R, mode=Mode.SUBTRACT)
    extrude(amount=-EXTRUDE_15_DEPTH)

    # 草图34 → 凸台-拉伸18 (add)
    with BuildSketch(Plane(origin=(0, 7.5, 0), x_dir=(1, 0, 0), z_dir=(0, 1, 0)).offset(EXTRUDE_START_3)):
        with Locations((-22.299999999999997, -3)):
            Circle(SKETCH_34_R)
        with Locations(Location((-22.299999999999997, -3, 0), (0, 0, 90))):
            Circle(SKETCH_34_R_2, mode=Mode.SUBTRACT)
    extrude(amount=EXTRUDE_18_DEPTH)

    # 打孔尺寸(%根据十字)槽沉头木螺钉的类型2 (through all)
    with Locations(Plane(origin=(11.7, 8.5, 3), x_dir=(0, 0, 1), z_dir=(0, 1, 0))):
        with Locations((0, 0)):
            CounterSinkHole(HOLE_WIZARD_2_D / 2, HOLE_WIZARD_2_CSINK_D / 2, counter_sink_angle=HOLE_WIZARD_2_CSINK_ANGLE)

    # 打孔尺寸(%根据十字)槽沉头木螺钉的类型2 on face 2 (through all)
    with Locations(Plane(origin=(-22.3, 7.5, 3), x_dir=(0, 0, 1), z_dir=(0, 1, 0))):
        with Locations((0, 0)):
            CounterSinkHole(HOLE_WIZARD_2_ON_FACE_2_D / 2, HOLE_WIZARD_2_ON_FACE_2_CSINK_D / 2, counter_sink_angle=HOLE_WIZARD_2_ON_FACE_2_CSINK_ANGLE)

    # 草图35 → 凸台-拉伸19 (add)
    with BuildSketch(Plane(origin=(0, 10.499999999999998, 0), x_dir=(1, 0, 0), z_dir=(0, 1, 0))):
        Polygon((15.7, -30.500000000000004), (15.7, -17.25), (22.25, -17.25), align=None)
    extrude(amount=-EXTRUDE_19_DEPTH)

    # 草图36 → 凸台-拉伸20 (add)
    with BuildSketch(Plane.ZY.offset(-7.70000000000001)):
        Polygon((17.25, 10.499999999999998), (23.250000000000004, 10.499999999999998), (17.25, 16), align=None)
    extrude(amount=-EXTRUDE_20_DEPTH)

    # 草图37 → 切除-拉伸12 (cut)
    with BuildSketch(Plane(origin=(0, 16, 0), x_dir=(1, 0, 0), z_dir=(0, 1, 0))):
        Polygon((15.7, -30.500000000000004), (22.25, -17.25), (25.200000000000006, -17.250000000000004), (25.200000000000006, -30.824811105739553), align=None)
    extrude(amount=-CUT_EXTRUDE_12_DEPTH, mode=Mode.SUBTRACT)


solid = part.part
